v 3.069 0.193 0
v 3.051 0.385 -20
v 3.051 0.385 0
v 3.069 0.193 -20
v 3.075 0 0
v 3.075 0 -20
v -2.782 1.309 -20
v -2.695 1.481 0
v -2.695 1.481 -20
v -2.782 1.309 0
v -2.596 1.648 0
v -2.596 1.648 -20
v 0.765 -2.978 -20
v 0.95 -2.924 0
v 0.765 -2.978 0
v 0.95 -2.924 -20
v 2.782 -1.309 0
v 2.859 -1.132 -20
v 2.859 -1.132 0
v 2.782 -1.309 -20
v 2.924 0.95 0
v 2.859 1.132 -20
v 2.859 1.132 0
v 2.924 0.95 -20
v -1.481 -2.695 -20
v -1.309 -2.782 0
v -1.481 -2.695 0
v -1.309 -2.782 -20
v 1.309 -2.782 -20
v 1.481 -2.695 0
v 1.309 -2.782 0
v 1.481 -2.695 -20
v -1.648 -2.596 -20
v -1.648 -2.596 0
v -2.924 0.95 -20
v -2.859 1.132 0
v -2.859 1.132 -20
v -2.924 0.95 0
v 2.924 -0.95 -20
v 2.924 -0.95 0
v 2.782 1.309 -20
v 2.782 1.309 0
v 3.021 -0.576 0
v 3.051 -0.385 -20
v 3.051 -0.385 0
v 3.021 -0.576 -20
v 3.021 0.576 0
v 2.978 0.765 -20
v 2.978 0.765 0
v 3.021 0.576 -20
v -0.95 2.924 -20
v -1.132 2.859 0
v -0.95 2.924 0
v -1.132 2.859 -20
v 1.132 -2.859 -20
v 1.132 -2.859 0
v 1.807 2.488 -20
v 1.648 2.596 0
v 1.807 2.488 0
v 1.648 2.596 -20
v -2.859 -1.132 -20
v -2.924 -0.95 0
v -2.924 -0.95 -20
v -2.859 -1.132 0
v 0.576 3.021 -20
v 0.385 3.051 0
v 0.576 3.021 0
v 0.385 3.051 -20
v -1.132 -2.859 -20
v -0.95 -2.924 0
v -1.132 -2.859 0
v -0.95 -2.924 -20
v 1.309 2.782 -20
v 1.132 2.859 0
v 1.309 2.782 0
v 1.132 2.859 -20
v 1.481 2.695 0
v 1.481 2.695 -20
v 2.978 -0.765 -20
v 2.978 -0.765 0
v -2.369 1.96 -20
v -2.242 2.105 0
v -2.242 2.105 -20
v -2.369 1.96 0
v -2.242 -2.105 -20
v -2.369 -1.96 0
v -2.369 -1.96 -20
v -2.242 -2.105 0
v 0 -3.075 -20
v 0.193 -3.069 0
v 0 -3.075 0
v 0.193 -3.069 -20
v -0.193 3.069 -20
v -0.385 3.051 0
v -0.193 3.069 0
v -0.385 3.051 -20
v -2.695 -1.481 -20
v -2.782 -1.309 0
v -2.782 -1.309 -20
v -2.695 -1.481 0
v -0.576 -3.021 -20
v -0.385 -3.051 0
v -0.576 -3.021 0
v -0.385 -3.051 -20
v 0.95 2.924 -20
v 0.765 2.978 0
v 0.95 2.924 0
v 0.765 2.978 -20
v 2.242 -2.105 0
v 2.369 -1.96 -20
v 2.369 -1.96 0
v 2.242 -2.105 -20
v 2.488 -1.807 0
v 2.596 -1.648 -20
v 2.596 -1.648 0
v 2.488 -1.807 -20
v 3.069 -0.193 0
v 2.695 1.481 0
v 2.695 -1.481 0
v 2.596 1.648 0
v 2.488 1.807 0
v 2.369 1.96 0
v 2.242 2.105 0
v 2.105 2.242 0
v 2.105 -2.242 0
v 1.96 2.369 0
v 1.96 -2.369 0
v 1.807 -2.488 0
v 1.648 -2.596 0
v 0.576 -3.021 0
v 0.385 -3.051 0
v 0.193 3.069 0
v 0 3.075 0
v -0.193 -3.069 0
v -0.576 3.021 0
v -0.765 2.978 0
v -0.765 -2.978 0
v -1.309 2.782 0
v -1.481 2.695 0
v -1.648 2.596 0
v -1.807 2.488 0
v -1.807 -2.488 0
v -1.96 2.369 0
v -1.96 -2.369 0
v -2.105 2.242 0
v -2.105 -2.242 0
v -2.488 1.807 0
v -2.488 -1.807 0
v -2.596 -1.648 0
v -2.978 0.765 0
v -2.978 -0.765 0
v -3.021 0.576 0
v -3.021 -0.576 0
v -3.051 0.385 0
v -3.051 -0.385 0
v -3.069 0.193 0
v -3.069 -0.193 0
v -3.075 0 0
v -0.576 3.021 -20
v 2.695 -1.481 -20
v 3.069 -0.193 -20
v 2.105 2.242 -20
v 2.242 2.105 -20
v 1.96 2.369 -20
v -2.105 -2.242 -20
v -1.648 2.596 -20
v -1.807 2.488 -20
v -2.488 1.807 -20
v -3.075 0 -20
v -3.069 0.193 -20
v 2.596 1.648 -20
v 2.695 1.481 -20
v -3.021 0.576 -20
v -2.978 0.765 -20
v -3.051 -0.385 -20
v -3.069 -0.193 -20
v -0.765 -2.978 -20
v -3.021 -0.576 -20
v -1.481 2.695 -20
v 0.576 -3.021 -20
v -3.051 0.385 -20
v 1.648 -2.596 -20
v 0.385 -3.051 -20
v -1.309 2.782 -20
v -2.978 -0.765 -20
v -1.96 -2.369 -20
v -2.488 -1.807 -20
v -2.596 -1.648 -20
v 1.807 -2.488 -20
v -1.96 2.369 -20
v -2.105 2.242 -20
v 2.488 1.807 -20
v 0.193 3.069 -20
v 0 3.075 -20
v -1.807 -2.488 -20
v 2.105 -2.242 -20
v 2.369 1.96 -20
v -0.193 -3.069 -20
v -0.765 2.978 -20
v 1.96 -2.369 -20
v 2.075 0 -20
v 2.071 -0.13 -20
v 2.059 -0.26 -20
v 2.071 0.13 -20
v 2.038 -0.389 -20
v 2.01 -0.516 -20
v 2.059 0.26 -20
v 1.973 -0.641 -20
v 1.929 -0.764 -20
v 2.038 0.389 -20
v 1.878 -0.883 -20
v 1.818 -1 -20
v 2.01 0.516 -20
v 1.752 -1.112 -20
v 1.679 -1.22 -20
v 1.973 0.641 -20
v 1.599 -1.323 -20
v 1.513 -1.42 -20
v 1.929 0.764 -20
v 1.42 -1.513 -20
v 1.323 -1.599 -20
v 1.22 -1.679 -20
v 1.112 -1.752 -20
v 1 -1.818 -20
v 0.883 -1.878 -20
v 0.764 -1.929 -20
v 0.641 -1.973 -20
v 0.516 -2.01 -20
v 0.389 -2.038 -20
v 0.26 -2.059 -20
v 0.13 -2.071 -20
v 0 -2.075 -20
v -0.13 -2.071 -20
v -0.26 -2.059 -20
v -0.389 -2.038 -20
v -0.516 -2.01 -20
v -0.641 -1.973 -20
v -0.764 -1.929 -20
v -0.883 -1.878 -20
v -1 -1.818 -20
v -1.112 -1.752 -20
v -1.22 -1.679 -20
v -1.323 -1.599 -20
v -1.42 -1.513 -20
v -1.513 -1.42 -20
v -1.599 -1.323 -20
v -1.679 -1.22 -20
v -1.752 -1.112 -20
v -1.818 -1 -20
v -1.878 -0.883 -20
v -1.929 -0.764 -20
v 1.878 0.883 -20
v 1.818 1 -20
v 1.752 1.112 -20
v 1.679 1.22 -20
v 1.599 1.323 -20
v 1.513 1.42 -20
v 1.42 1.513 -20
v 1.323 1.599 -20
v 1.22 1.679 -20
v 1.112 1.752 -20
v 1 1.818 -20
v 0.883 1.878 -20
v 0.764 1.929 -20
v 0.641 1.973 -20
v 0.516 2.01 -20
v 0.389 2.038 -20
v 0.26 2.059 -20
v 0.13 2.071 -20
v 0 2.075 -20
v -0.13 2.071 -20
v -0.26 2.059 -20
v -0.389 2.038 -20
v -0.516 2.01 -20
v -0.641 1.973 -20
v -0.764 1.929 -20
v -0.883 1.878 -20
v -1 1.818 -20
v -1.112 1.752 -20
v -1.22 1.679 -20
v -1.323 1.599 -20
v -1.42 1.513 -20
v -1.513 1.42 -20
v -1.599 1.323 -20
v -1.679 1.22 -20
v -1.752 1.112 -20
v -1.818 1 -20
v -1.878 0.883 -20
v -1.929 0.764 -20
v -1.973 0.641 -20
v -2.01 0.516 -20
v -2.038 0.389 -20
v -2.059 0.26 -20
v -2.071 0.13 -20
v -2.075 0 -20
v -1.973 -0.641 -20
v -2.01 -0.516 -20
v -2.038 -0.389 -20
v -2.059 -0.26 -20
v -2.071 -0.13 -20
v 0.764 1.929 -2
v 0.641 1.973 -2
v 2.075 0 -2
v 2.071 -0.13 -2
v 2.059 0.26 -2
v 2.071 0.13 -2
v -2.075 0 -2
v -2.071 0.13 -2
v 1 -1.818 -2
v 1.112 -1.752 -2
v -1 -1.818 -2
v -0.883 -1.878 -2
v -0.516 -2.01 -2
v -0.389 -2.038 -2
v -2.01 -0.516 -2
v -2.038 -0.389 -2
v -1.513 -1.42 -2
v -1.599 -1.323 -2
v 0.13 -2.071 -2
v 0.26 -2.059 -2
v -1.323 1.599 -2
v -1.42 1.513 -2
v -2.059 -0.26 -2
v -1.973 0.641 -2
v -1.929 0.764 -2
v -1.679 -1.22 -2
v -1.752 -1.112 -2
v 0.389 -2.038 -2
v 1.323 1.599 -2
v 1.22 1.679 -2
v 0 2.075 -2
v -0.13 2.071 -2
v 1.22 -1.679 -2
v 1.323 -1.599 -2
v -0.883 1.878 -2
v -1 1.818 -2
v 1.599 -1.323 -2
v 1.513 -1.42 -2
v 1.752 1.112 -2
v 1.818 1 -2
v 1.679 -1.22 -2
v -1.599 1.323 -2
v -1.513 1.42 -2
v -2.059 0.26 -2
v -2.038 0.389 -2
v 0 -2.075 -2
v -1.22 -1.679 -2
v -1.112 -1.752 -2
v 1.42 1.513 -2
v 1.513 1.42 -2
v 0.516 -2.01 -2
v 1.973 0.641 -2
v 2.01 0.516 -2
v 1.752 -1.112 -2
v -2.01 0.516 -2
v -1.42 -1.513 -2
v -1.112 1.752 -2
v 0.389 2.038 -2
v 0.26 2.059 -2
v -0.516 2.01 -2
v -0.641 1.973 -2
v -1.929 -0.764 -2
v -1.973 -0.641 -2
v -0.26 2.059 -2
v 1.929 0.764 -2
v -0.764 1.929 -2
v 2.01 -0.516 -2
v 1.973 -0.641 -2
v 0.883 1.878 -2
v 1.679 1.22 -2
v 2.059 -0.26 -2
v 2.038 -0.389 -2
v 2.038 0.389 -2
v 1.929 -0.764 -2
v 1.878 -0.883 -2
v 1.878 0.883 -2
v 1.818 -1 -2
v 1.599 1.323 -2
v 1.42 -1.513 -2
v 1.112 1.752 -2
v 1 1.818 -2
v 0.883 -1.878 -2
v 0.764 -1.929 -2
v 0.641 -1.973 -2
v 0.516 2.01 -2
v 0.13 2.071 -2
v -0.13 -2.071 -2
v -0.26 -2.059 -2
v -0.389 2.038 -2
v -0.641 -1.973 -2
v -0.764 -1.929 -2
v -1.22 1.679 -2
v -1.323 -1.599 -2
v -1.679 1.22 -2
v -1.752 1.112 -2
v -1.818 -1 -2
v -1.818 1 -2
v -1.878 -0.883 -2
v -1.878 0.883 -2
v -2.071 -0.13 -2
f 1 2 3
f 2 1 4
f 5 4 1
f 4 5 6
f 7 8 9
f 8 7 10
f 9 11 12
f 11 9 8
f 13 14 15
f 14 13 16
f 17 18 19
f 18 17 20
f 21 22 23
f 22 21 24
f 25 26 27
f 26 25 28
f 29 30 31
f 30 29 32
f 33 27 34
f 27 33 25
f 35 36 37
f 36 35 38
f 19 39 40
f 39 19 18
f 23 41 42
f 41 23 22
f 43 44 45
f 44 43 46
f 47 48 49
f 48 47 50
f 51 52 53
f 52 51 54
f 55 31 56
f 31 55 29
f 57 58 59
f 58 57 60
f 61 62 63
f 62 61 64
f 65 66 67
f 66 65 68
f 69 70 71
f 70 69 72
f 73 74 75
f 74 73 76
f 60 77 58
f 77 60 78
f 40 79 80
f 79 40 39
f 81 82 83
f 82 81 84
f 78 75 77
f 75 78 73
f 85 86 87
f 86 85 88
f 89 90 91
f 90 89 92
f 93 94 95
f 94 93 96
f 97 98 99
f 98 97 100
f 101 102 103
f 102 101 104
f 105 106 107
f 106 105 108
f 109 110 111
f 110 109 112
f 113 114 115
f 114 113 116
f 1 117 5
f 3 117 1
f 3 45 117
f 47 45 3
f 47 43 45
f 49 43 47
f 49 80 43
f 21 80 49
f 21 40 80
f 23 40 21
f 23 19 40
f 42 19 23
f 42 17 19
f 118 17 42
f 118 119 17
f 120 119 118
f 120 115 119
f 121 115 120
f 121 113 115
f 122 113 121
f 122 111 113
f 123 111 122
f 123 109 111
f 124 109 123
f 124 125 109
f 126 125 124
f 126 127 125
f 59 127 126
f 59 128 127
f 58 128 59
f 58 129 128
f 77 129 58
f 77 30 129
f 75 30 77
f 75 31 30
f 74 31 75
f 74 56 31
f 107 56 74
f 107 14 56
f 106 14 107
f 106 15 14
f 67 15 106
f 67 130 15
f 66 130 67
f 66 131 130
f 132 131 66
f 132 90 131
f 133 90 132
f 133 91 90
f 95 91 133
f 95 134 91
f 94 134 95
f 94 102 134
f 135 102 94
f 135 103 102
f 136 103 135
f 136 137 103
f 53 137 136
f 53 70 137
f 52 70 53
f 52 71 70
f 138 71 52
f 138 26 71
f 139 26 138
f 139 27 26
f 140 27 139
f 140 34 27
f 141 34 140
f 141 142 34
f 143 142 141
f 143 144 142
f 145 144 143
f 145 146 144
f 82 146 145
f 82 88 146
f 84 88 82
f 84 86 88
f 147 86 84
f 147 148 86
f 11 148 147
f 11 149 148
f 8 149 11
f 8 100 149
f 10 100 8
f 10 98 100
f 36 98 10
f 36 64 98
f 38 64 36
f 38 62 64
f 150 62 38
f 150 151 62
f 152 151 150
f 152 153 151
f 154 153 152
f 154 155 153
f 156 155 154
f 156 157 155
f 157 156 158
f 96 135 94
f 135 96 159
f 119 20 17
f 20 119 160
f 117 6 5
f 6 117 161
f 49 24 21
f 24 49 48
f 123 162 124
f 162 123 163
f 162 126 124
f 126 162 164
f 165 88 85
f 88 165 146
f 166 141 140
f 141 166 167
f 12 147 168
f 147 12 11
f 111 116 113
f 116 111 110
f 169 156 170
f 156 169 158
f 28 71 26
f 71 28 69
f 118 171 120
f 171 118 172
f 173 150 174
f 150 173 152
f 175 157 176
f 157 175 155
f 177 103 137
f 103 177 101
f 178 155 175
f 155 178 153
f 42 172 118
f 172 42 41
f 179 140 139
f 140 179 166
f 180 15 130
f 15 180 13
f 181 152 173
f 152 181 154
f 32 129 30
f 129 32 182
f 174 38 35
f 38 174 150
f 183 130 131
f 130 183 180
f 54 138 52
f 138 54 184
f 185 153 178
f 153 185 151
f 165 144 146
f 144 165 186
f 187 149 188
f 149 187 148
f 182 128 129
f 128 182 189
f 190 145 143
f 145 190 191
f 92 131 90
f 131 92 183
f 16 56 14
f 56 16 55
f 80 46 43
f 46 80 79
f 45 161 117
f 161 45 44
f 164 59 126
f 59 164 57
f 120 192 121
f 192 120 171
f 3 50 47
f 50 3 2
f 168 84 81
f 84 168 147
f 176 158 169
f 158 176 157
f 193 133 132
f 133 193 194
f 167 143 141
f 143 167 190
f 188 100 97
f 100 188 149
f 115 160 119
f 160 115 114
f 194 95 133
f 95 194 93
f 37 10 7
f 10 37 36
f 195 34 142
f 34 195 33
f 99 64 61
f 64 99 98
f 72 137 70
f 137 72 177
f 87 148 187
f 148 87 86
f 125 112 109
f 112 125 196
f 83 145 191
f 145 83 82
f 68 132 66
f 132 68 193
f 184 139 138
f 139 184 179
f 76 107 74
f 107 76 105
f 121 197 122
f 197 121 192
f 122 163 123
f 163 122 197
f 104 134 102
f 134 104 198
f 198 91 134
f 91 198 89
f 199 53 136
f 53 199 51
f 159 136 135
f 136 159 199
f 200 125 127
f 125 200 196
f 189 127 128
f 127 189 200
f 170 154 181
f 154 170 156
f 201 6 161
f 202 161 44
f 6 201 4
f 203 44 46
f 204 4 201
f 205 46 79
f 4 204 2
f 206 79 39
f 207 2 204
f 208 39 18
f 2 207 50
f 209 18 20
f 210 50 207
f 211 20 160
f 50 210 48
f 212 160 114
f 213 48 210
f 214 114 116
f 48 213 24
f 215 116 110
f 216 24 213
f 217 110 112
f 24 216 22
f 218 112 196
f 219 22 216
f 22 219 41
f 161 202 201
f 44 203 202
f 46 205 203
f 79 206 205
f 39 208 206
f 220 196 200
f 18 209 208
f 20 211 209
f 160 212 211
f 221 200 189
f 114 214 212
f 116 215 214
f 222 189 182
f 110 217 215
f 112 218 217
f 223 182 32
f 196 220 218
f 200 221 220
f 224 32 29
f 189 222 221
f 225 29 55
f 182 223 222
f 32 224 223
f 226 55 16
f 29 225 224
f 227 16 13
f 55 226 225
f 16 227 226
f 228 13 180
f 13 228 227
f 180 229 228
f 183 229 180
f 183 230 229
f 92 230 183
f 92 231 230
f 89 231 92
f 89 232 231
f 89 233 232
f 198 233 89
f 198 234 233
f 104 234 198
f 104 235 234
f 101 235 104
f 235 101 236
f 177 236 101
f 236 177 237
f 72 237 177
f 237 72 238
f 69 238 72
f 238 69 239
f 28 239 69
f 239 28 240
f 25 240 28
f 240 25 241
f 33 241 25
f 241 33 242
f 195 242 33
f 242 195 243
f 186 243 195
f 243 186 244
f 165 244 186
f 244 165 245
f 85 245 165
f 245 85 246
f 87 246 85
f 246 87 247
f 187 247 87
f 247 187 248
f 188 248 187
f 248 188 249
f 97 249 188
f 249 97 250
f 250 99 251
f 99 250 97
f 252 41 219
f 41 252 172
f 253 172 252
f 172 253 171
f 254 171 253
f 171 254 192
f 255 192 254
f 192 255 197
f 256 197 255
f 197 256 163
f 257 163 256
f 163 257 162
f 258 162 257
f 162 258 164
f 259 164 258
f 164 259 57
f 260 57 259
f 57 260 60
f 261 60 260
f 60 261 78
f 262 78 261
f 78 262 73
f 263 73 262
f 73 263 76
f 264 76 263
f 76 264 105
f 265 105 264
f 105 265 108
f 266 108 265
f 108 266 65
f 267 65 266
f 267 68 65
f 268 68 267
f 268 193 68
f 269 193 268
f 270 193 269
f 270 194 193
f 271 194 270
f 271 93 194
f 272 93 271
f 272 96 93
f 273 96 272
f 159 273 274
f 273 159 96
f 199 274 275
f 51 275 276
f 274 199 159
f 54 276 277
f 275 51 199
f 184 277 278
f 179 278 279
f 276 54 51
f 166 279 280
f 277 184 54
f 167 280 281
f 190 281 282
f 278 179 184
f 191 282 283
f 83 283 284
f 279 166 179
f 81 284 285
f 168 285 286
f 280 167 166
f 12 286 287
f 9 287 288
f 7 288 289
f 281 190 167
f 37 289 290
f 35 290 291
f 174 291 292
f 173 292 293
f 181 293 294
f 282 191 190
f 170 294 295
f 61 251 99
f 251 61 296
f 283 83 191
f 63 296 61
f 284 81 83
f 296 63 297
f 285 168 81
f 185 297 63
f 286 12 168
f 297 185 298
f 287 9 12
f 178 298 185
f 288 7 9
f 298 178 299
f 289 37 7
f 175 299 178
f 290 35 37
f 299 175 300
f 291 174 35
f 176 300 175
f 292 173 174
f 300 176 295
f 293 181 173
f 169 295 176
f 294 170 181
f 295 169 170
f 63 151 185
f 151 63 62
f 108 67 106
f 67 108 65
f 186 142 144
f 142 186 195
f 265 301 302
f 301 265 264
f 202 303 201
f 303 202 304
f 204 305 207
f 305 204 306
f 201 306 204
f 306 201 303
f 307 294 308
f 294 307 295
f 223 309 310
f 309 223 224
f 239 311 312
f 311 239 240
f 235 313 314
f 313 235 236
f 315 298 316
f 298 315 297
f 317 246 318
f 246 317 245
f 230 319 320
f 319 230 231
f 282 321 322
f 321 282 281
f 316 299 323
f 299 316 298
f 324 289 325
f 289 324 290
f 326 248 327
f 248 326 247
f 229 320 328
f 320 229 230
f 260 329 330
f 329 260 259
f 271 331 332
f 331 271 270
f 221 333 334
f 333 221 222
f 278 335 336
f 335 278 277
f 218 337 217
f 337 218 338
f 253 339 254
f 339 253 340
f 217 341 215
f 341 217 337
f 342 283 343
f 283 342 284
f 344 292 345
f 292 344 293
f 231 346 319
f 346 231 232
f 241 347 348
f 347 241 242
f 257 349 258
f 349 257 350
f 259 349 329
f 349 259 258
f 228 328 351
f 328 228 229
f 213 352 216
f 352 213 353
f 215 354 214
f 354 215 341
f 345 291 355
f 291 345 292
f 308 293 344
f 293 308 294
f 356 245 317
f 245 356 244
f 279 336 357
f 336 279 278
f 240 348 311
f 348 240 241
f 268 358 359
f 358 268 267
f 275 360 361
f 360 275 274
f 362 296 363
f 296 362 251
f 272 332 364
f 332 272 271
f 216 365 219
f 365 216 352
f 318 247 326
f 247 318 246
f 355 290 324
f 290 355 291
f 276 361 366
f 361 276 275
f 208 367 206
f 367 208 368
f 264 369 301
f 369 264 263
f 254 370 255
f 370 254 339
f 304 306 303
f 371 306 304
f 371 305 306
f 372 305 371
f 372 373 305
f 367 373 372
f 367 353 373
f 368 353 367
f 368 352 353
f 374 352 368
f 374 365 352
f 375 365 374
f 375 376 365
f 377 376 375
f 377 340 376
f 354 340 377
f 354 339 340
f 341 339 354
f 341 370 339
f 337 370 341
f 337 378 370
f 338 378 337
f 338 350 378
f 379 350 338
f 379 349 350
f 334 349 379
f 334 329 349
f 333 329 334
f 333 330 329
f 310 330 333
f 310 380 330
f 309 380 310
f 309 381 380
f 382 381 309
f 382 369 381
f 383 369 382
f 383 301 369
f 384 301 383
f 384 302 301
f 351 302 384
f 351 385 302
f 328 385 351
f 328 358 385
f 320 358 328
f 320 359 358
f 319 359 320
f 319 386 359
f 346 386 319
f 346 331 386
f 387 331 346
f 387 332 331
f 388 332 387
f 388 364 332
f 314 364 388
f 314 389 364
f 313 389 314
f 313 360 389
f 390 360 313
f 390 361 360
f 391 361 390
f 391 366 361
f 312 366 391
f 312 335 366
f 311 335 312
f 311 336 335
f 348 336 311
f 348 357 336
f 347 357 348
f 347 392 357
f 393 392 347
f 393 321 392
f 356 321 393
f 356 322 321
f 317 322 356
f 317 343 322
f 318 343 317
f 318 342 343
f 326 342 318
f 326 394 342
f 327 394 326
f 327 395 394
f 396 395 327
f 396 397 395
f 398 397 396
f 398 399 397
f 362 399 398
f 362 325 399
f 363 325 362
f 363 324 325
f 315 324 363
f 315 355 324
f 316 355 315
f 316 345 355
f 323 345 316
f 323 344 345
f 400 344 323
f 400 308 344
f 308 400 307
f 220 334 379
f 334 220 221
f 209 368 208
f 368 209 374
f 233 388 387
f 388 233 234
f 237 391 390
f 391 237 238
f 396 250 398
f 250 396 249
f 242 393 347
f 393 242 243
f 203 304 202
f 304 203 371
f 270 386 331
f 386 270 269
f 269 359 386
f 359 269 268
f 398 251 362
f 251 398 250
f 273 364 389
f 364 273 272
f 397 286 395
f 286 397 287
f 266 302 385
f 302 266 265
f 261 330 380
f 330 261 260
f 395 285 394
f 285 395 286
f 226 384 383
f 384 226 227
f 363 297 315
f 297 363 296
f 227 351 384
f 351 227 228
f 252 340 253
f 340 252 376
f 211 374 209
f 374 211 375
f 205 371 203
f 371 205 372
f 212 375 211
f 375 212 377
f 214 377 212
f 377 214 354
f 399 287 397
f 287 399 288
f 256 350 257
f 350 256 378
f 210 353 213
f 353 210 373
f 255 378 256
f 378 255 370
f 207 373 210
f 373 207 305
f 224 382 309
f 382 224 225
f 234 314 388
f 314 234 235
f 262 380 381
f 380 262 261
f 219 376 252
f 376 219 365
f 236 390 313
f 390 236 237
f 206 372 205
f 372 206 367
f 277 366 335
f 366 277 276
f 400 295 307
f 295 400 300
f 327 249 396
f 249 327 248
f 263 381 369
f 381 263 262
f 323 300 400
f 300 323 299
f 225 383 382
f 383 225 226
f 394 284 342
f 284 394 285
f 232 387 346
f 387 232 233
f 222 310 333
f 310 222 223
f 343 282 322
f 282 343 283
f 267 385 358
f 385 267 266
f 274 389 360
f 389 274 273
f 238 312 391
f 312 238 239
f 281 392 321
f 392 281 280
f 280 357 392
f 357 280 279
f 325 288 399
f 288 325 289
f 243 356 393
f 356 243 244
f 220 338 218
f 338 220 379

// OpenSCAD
// This is the bottom pin which is used to mount the sample holders into the machines.
// Since we use this for most of our models, it makes sense to have a small 'template' which we can just add the model where it's needed...
// To do so, add a line with "use<bottom_pin.scad>"
// And then just call "pin();" wherever you need the pin :)
$fn=100;
module pin(diameter=6.15, height=20, cap_depth=2)
{
    translate([0,0,-height]) difference(){
        cylinder(d=diameter,h=height);
        cylinder(d=diameter-2,h=height-cap_depth);
    }
}
pin();
